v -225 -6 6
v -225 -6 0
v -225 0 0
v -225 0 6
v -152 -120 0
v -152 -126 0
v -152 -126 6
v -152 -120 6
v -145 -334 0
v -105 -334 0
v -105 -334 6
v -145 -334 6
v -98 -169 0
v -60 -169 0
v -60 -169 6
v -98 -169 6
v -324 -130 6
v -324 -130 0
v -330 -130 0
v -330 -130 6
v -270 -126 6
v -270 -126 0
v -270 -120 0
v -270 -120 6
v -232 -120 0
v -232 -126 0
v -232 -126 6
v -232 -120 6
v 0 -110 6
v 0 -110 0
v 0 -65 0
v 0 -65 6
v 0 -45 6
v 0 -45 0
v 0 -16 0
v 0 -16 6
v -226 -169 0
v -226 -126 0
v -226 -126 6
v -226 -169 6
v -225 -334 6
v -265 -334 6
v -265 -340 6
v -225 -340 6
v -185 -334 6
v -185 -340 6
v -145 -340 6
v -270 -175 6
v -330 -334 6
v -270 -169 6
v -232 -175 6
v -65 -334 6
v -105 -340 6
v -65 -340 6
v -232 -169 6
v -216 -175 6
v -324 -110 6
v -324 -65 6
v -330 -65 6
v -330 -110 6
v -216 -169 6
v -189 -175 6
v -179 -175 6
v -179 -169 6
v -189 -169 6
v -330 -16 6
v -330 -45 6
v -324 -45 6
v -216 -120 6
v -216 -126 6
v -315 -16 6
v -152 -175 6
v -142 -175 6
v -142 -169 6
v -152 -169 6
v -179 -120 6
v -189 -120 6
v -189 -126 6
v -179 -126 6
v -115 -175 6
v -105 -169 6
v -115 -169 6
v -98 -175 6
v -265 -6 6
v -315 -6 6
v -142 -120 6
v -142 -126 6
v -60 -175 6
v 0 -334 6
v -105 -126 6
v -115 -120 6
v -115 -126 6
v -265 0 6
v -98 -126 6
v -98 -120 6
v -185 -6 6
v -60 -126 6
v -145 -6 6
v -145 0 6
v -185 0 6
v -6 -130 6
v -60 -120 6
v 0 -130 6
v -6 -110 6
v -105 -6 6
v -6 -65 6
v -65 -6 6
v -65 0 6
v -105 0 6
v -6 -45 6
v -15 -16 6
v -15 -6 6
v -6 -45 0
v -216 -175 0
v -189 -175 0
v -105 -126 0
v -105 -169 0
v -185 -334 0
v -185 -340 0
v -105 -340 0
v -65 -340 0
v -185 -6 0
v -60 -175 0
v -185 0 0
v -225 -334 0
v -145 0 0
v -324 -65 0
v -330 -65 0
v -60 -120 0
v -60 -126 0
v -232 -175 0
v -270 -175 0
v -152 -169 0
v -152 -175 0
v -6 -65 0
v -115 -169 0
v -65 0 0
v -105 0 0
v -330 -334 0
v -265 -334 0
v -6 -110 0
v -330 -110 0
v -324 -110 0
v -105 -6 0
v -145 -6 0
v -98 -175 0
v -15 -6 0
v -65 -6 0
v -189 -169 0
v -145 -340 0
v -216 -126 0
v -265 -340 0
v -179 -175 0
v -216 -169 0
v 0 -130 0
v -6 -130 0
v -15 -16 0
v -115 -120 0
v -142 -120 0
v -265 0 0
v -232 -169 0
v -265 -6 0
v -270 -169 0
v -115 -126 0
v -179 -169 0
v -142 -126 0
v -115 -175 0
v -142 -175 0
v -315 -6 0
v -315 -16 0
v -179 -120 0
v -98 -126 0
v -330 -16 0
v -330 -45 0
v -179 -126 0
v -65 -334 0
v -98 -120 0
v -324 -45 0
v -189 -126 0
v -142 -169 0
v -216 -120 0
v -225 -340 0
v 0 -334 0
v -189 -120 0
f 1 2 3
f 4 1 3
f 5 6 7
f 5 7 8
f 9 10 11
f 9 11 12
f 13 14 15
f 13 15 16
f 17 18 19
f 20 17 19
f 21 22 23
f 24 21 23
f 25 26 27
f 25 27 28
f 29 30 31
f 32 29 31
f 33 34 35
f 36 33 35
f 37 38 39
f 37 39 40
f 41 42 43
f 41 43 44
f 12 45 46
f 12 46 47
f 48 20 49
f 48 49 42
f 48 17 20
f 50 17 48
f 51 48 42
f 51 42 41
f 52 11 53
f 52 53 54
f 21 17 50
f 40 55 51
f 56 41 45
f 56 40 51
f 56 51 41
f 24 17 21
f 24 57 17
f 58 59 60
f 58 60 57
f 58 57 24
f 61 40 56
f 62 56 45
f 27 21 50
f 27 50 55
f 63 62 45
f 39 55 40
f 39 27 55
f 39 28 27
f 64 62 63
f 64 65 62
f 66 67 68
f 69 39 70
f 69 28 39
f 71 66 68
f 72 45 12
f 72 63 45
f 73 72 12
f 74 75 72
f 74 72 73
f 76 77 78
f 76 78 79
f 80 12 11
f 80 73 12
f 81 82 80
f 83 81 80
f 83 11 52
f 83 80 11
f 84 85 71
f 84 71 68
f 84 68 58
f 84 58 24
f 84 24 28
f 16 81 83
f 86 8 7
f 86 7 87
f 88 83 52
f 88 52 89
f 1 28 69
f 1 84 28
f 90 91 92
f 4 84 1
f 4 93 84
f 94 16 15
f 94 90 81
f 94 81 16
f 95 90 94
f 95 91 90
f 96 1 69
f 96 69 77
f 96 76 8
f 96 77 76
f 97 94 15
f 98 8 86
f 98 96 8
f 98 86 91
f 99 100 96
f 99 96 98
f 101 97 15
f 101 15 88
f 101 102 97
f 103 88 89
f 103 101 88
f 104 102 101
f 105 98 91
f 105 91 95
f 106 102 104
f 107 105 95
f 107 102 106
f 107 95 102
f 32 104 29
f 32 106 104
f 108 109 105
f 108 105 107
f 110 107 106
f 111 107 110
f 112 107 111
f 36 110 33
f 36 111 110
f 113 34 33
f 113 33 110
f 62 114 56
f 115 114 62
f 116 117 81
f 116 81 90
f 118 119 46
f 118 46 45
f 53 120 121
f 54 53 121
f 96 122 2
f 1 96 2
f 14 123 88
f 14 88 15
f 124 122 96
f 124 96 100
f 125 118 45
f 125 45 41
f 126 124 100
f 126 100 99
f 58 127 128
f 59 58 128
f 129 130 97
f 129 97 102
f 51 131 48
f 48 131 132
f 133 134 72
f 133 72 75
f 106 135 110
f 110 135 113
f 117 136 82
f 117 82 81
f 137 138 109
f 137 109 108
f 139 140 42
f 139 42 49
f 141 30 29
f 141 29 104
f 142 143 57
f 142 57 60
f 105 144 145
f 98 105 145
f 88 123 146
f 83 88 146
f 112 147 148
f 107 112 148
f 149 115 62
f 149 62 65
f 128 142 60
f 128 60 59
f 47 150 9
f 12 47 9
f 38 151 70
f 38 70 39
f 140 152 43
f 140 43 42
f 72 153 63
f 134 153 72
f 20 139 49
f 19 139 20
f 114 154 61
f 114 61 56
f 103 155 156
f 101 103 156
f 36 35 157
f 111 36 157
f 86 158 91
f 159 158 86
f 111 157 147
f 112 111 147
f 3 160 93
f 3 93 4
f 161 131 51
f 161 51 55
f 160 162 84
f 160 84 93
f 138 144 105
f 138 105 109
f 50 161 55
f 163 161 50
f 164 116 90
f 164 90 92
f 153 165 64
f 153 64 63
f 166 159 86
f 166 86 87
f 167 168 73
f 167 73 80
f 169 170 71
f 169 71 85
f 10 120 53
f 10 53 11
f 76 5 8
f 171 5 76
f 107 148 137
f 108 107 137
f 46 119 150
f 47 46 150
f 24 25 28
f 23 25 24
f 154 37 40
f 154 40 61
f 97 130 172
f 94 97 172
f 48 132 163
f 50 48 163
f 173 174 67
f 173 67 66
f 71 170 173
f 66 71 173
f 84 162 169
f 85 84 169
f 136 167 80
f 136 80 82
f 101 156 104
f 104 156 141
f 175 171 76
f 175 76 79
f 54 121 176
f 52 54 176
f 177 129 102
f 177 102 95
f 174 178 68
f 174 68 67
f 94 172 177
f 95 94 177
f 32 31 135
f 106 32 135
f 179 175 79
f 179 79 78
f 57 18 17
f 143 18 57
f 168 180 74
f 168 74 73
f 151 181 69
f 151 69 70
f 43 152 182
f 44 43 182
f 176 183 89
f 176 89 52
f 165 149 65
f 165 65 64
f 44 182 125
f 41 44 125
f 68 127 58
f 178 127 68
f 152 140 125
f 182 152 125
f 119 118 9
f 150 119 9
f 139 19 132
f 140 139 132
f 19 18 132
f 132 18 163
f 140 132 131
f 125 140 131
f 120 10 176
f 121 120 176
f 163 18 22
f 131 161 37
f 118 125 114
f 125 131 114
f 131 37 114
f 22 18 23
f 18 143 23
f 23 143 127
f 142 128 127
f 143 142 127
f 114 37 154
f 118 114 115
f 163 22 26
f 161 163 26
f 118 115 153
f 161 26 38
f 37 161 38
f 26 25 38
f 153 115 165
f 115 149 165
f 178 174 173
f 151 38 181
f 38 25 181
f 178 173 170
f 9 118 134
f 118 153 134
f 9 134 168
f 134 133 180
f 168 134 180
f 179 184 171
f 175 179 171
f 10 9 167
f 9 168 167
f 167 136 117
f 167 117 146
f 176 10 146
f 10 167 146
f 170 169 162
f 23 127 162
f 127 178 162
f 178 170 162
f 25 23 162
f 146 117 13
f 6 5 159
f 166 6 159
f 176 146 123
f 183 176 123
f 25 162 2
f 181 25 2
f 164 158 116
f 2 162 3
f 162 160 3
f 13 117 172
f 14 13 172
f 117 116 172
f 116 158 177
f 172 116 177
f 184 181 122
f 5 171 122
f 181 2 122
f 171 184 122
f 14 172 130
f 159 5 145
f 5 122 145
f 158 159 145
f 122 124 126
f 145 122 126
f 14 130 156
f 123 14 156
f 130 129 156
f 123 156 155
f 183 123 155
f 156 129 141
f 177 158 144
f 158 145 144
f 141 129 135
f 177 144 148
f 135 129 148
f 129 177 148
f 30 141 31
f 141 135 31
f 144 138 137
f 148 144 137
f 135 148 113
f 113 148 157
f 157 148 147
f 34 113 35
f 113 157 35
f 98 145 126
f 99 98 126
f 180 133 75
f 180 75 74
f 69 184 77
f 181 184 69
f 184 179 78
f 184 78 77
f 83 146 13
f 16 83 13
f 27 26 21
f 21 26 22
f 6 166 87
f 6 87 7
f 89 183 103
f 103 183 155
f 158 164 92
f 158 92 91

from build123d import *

# Parameters (mm, degrees)
ESQUISSE2_W                            = 330
ESQUISSE2_H                            = 340
BOSS_EXTRU_1_DEPTH                     = 6
ESQUISSE4_W                            = 65
ESQUISSE4_H                            = 6
ESQUISSE4_W_2                          = 40
ESQUISSE4_W_3                          = 6
ESQUISSE4_H_2                          = 20
ENL_V_MAT_ENCOCHE_BORD_DEPTH           = 474.852297662
ESQUISSE5_W                            = 38
ESQUISSE5_H                            = 6
ESQUISSE5_W_2                          = 15
ESQUISSE5_H_2                          = 10
ENL_V_MAT_ENCOCHE_TAGE_ROULETTES_DEPTH = 474.852297662
ENL_V_MAT_EXTRU_2_DEPTH                = 6


with BuildPart() as part:
    # Esquisse2 → Boss.-Extru.1 (new body)
    with BuildSketch(Plane.XY):
        with Locations((-165, -170)):
            Rectangle(ESQUISSE2_W, ESQUISSE2_H)
    extrude(amount=BOSS_EXTRU_1_DEPTH)

    # Esquisse4 → Enlèv. mat encoche bord (cut, through all)
    with BuildSketch(Plane(origin=(0, 0, 0), x_dir=(-1, 0, 0), z_dir=(0, 0, -1))):
        with Locations((297.5, -3)):
            Rectangle(ESQUISSE4_W, ESQUISSE4_H)
        with Locations((205, -3)):
            Rectangle(ESQUISSE4_W_2, ESQUISSE4_H)
        with Locations((125, -3)):
            Rectangle(ESQUISSE4_W_2, ESQUISSE4_H)
        with Locations((32.5, -3)):
            Rectangle(ESQUISSE4_W, ESQUISSE4_H)
        with Locations((327, -55)):
            Rectangle(ESQUISSE4_W_3, ESQUISSE4_H_2)
        with Locations((3, -55)):
            Rectangle(ESQUISSE4_W_3, ESQUISSE4_H_2)
        with Locations((297.5, -337)):
            Rectangle(ESQUISSE4_W, ESQUISSE4_H)
        with Locations((205, -337)):
            Rectangle(ESQUISSE4_W_2, ESQUISSE4_H)
        with Locations((125, -337)):
            Rectangle(ESQUISSE4_W_2, ESQUISSE4_H)
        with Locations((32.5, -337)):
            Rectangle(ESQUISSE4_W, ESQUISSE4_H)
        with Locations((327, -120)):
            Rectangle(ESQUISSE4_W_3, ESQUISSE4_H_2)
        with Locations((3, -120)):
            Rectangle(ESQUISSE4_W_3, ESQUISSE4_H_2)
    extrude(amount=-ENL_V_MAT_ENCOCHE_BORD_DEPTH, mode=Mode.SUBTRACT)

    # Esquisse5 → Enlèv. mat encoche étage + roulettes (cut, through all)
    with BuildSketch(Plane(origin=(0, 0, 0), x_dir=(-1, 0, 0), z_dir=(0, 0, -1))):
        with Locations((251, -172)):
            Rectangle(ESQUISSE5_W, ESQUISSE5_H)
        with Locations((79, -172)):
            Rectangle(ESQUISSE5_W, ESQUISSE5_H)
        with Locations((322.5, -11)):
            Rectangle(ESQUISSE5_W_2, ESQUISSE5_H_2)
        with Locations((7.5, -11)):
            Rectangle(ESQUISSE5_W_2, ESQUISSE5_H_2)
        with Locations((251, -123)):
            Rectangle(ESQUISSE5_W, ESQUISSE5_H)
        with Locations((79, -123)):
            Rectangle(ESQUISSE5_W, ESQUISSE5_H)
    extrude(amount=-ENL_V_MAT_ENCOCHE_TAGE_ROULETTES_DEPTH, mode=Mode.SUBTRACT)

    # Esquisse6 → Enlèv. mat.-Extru.2 (cut)
    with BuildSketch(Plane(origin=(0, 0, 0), x_dir=(-1, 0, 0), z_dir=(0, 0, -1))):
        Polygon((226, -169), (216, -169), (216, -175), (189, -175), (189, -169), (179, -169), (179, -175), (152, -175), (152, -169), (142, -169), (142, -175), (115, -175), (115, -169), (105, -169), (105, -126), (115, -126), (115, -120), (142, -120), (142, -126), (152, -126), (152, -120), (179, -120), (179, -126), (189, -126), (189, -120), (216, -120), (216, -126), (226, -126), align=None)
    extrude(amount=-ENL_V_MAT_EXTRU_2_DEPTH, mode=Mode.SUBTRACT)


solid = part.part
